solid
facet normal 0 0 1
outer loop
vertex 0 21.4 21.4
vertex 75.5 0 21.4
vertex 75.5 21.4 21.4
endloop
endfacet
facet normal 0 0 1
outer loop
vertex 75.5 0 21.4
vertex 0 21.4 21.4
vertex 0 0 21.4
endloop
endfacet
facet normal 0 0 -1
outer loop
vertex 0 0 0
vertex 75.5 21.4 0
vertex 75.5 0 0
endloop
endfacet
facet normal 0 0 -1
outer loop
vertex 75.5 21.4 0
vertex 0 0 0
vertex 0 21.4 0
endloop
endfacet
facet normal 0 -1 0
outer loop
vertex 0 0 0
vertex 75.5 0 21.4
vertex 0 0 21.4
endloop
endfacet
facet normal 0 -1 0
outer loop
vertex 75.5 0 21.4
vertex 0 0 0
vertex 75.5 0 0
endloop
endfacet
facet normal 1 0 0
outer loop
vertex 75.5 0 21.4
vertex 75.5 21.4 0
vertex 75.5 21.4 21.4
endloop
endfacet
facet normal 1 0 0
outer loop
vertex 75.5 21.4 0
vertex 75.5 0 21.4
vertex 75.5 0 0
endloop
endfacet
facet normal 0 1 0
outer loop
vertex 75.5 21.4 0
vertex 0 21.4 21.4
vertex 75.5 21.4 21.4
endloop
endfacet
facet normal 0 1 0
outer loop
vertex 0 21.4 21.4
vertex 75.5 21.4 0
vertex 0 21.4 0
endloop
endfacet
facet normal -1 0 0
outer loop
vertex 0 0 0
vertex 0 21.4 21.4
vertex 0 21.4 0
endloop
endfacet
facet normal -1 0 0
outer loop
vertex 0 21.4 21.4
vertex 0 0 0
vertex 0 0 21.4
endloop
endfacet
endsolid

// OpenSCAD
module battery() {
    color("red")
    cube([75.5, 21.4, 21.4], center = false);
}


battery();
